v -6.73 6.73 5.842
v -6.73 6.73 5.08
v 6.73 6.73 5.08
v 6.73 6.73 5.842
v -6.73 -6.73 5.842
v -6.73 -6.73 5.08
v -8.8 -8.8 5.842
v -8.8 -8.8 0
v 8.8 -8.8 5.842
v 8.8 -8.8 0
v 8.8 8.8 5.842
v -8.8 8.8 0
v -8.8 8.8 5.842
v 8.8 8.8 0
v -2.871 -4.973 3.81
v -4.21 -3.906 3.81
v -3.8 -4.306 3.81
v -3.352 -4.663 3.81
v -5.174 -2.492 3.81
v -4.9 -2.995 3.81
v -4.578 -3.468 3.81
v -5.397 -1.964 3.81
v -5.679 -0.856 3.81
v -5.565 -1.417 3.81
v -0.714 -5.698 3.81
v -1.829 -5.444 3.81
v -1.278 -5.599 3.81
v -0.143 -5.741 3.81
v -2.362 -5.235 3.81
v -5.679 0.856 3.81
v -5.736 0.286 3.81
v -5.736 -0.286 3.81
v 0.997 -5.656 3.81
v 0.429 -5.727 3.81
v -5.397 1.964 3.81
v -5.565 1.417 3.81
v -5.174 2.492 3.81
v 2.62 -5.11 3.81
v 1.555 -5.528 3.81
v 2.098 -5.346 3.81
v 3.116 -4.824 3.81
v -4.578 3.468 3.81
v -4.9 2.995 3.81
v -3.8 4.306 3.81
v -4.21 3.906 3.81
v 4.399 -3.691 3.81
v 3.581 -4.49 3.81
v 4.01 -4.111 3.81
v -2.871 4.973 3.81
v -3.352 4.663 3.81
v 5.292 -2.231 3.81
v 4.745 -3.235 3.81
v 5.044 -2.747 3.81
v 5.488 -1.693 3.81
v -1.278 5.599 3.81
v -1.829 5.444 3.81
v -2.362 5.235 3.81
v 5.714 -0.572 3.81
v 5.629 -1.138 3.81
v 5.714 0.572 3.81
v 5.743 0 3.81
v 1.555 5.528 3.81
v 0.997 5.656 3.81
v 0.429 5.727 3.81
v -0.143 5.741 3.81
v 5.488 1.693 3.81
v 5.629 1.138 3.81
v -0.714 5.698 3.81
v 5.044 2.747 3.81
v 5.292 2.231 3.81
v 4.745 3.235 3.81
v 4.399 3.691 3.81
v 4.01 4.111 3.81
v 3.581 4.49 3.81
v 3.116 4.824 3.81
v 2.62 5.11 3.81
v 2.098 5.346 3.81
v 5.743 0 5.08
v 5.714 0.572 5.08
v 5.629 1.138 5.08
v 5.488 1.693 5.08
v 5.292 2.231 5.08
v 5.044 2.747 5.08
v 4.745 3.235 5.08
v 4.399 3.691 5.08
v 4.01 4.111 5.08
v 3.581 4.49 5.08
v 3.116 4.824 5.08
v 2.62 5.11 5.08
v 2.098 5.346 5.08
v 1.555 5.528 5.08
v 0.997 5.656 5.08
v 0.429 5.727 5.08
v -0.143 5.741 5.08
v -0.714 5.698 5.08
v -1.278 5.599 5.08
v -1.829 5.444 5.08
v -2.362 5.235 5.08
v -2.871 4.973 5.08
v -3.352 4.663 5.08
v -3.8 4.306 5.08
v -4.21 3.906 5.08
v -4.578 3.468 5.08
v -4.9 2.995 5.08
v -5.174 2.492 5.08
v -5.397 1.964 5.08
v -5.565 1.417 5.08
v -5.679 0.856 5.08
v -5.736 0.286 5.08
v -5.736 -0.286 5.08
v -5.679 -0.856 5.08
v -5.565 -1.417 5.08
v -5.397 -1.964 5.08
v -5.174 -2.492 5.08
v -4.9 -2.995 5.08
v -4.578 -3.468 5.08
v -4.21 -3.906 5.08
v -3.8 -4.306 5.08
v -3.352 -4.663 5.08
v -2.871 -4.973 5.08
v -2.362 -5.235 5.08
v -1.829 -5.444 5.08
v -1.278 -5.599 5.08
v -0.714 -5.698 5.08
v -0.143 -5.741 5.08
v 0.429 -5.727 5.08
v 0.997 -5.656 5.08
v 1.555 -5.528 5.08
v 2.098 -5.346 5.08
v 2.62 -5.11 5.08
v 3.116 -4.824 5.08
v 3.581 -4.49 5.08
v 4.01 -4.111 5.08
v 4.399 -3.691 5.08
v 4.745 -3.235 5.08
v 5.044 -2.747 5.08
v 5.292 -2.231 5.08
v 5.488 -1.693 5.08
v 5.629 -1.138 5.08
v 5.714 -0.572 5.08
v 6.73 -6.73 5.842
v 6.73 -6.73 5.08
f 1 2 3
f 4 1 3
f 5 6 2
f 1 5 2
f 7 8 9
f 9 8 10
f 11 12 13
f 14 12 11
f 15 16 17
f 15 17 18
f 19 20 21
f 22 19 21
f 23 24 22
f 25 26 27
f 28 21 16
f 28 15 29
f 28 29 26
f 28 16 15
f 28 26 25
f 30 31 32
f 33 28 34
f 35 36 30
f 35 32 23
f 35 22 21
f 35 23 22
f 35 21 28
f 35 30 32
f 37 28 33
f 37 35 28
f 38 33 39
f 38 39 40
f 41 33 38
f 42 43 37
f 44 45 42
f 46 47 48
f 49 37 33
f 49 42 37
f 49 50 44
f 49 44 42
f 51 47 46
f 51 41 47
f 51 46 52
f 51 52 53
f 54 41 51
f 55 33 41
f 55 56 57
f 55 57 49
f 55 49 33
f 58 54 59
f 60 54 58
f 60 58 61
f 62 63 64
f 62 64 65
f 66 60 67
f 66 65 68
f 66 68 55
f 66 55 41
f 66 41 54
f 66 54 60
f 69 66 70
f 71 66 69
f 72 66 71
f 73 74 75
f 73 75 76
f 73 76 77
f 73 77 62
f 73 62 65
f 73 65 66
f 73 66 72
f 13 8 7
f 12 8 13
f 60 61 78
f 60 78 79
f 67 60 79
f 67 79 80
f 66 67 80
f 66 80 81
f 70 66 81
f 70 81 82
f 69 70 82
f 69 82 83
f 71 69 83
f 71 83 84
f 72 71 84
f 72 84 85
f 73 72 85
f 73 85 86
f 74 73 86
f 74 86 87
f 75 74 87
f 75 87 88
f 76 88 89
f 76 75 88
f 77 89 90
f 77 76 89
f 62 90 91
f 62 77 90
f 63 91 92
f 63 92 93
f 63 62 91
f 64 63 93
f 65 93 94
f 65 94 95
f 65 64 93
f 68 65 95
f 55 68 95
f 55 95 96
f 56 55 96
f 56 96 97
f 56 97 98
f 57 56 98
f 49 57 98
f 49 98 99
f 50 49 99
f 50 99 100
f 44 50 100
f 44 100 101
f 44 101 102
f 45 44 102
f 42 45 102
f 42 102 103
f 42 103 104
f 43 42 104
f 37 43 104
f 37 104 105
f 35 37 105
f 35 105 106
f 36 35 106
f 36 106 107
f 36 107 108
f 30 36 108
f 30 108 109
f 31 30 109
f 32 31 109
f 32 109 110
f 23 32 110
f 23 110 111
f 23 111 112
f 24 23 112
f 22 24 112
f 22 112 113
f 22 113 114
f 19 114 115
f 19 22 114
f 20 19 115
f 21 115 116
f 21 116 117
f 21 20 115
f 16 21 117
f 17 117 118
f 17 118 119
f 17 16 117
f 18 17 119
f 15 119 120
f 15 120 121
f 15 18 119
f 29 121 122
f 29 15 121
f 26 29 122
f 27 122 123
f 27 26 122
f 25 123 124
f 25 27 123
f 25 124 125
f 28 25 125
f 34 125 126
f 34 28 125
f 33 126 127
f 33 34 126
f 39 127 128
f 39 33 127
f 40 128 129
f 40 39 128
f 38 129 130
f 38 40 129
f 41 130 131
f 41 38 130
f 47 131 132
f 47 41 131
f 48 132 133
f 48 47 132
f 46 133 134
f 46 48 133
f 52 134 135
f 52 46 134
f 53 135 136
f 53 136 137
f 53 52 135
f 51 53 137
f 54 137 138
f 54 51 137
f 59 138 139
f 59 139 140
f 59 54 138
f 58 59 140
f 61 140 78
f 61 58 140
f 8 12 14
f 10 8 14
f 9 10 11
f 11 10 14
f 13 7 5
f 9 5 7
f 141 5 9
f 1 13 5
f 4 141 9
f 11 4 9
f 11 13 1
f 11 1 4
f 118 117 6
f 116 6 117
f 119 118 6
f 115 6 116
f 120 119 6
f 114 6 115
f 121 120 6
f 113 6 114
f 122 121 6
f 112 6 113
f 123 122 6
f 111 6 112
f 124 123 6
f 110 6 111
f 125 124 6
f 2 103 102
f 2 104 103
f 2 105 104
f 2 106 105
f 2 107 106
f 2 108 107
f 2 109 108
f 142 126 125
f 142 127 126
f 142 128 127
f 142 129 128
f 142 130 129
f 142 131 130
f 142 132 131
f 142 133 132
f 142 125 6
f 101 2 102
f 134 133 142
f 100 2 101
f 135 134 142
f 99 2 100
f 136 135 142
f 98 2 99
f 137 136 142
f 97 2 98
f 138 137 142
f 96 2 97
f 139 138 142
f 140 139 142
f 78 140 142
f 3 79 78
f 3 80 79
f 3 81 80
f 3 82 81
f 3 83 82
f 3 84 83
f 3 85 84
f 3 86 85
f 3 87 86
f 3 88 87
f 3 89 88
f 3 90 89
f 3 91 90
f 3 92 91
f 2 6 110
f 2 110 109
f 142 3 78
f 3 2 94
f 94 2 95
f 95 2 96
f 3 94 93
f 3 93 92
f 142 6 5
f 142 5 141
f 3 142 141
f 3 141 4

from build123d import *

# Parameters (mm, degrees)
F0_W     = 13.46
F0_H     = 13.46
F0_R     = 5.742874
F1_DEPTH = 5.08
F0_W_2   = 17.6
F0_H_2   = 17.6
F2_DEPTH = 5.842
F3_DEPTH = 3.81


with BuildPart() as f1:
    # F0 (on Top) → F1 (new body)
    with BuildSketch(Plane.XY):
        Rectangle(F0_W, F0_H)
        Circle(F0_R, mode=Mode.SUBTRACT)
    extrude(amount=F1_DEPTH)

    # F0 (on Top) → F2 (join)
    with BuildSketch(Plane.XY):
        Rectangle(F0_W_2, F0_H_2)
        Rectangle(F0_W, F0_H, mode=Mode.SUBTRACT)
    extrude(amount=F2_DEPTH)

    # F0 (on Top) → F3 (join)
    with BuildSketch(Plane.XY):
        Circle(F0_R)
    extrude(amount=F3_DEPTH)


solid = f1.part
